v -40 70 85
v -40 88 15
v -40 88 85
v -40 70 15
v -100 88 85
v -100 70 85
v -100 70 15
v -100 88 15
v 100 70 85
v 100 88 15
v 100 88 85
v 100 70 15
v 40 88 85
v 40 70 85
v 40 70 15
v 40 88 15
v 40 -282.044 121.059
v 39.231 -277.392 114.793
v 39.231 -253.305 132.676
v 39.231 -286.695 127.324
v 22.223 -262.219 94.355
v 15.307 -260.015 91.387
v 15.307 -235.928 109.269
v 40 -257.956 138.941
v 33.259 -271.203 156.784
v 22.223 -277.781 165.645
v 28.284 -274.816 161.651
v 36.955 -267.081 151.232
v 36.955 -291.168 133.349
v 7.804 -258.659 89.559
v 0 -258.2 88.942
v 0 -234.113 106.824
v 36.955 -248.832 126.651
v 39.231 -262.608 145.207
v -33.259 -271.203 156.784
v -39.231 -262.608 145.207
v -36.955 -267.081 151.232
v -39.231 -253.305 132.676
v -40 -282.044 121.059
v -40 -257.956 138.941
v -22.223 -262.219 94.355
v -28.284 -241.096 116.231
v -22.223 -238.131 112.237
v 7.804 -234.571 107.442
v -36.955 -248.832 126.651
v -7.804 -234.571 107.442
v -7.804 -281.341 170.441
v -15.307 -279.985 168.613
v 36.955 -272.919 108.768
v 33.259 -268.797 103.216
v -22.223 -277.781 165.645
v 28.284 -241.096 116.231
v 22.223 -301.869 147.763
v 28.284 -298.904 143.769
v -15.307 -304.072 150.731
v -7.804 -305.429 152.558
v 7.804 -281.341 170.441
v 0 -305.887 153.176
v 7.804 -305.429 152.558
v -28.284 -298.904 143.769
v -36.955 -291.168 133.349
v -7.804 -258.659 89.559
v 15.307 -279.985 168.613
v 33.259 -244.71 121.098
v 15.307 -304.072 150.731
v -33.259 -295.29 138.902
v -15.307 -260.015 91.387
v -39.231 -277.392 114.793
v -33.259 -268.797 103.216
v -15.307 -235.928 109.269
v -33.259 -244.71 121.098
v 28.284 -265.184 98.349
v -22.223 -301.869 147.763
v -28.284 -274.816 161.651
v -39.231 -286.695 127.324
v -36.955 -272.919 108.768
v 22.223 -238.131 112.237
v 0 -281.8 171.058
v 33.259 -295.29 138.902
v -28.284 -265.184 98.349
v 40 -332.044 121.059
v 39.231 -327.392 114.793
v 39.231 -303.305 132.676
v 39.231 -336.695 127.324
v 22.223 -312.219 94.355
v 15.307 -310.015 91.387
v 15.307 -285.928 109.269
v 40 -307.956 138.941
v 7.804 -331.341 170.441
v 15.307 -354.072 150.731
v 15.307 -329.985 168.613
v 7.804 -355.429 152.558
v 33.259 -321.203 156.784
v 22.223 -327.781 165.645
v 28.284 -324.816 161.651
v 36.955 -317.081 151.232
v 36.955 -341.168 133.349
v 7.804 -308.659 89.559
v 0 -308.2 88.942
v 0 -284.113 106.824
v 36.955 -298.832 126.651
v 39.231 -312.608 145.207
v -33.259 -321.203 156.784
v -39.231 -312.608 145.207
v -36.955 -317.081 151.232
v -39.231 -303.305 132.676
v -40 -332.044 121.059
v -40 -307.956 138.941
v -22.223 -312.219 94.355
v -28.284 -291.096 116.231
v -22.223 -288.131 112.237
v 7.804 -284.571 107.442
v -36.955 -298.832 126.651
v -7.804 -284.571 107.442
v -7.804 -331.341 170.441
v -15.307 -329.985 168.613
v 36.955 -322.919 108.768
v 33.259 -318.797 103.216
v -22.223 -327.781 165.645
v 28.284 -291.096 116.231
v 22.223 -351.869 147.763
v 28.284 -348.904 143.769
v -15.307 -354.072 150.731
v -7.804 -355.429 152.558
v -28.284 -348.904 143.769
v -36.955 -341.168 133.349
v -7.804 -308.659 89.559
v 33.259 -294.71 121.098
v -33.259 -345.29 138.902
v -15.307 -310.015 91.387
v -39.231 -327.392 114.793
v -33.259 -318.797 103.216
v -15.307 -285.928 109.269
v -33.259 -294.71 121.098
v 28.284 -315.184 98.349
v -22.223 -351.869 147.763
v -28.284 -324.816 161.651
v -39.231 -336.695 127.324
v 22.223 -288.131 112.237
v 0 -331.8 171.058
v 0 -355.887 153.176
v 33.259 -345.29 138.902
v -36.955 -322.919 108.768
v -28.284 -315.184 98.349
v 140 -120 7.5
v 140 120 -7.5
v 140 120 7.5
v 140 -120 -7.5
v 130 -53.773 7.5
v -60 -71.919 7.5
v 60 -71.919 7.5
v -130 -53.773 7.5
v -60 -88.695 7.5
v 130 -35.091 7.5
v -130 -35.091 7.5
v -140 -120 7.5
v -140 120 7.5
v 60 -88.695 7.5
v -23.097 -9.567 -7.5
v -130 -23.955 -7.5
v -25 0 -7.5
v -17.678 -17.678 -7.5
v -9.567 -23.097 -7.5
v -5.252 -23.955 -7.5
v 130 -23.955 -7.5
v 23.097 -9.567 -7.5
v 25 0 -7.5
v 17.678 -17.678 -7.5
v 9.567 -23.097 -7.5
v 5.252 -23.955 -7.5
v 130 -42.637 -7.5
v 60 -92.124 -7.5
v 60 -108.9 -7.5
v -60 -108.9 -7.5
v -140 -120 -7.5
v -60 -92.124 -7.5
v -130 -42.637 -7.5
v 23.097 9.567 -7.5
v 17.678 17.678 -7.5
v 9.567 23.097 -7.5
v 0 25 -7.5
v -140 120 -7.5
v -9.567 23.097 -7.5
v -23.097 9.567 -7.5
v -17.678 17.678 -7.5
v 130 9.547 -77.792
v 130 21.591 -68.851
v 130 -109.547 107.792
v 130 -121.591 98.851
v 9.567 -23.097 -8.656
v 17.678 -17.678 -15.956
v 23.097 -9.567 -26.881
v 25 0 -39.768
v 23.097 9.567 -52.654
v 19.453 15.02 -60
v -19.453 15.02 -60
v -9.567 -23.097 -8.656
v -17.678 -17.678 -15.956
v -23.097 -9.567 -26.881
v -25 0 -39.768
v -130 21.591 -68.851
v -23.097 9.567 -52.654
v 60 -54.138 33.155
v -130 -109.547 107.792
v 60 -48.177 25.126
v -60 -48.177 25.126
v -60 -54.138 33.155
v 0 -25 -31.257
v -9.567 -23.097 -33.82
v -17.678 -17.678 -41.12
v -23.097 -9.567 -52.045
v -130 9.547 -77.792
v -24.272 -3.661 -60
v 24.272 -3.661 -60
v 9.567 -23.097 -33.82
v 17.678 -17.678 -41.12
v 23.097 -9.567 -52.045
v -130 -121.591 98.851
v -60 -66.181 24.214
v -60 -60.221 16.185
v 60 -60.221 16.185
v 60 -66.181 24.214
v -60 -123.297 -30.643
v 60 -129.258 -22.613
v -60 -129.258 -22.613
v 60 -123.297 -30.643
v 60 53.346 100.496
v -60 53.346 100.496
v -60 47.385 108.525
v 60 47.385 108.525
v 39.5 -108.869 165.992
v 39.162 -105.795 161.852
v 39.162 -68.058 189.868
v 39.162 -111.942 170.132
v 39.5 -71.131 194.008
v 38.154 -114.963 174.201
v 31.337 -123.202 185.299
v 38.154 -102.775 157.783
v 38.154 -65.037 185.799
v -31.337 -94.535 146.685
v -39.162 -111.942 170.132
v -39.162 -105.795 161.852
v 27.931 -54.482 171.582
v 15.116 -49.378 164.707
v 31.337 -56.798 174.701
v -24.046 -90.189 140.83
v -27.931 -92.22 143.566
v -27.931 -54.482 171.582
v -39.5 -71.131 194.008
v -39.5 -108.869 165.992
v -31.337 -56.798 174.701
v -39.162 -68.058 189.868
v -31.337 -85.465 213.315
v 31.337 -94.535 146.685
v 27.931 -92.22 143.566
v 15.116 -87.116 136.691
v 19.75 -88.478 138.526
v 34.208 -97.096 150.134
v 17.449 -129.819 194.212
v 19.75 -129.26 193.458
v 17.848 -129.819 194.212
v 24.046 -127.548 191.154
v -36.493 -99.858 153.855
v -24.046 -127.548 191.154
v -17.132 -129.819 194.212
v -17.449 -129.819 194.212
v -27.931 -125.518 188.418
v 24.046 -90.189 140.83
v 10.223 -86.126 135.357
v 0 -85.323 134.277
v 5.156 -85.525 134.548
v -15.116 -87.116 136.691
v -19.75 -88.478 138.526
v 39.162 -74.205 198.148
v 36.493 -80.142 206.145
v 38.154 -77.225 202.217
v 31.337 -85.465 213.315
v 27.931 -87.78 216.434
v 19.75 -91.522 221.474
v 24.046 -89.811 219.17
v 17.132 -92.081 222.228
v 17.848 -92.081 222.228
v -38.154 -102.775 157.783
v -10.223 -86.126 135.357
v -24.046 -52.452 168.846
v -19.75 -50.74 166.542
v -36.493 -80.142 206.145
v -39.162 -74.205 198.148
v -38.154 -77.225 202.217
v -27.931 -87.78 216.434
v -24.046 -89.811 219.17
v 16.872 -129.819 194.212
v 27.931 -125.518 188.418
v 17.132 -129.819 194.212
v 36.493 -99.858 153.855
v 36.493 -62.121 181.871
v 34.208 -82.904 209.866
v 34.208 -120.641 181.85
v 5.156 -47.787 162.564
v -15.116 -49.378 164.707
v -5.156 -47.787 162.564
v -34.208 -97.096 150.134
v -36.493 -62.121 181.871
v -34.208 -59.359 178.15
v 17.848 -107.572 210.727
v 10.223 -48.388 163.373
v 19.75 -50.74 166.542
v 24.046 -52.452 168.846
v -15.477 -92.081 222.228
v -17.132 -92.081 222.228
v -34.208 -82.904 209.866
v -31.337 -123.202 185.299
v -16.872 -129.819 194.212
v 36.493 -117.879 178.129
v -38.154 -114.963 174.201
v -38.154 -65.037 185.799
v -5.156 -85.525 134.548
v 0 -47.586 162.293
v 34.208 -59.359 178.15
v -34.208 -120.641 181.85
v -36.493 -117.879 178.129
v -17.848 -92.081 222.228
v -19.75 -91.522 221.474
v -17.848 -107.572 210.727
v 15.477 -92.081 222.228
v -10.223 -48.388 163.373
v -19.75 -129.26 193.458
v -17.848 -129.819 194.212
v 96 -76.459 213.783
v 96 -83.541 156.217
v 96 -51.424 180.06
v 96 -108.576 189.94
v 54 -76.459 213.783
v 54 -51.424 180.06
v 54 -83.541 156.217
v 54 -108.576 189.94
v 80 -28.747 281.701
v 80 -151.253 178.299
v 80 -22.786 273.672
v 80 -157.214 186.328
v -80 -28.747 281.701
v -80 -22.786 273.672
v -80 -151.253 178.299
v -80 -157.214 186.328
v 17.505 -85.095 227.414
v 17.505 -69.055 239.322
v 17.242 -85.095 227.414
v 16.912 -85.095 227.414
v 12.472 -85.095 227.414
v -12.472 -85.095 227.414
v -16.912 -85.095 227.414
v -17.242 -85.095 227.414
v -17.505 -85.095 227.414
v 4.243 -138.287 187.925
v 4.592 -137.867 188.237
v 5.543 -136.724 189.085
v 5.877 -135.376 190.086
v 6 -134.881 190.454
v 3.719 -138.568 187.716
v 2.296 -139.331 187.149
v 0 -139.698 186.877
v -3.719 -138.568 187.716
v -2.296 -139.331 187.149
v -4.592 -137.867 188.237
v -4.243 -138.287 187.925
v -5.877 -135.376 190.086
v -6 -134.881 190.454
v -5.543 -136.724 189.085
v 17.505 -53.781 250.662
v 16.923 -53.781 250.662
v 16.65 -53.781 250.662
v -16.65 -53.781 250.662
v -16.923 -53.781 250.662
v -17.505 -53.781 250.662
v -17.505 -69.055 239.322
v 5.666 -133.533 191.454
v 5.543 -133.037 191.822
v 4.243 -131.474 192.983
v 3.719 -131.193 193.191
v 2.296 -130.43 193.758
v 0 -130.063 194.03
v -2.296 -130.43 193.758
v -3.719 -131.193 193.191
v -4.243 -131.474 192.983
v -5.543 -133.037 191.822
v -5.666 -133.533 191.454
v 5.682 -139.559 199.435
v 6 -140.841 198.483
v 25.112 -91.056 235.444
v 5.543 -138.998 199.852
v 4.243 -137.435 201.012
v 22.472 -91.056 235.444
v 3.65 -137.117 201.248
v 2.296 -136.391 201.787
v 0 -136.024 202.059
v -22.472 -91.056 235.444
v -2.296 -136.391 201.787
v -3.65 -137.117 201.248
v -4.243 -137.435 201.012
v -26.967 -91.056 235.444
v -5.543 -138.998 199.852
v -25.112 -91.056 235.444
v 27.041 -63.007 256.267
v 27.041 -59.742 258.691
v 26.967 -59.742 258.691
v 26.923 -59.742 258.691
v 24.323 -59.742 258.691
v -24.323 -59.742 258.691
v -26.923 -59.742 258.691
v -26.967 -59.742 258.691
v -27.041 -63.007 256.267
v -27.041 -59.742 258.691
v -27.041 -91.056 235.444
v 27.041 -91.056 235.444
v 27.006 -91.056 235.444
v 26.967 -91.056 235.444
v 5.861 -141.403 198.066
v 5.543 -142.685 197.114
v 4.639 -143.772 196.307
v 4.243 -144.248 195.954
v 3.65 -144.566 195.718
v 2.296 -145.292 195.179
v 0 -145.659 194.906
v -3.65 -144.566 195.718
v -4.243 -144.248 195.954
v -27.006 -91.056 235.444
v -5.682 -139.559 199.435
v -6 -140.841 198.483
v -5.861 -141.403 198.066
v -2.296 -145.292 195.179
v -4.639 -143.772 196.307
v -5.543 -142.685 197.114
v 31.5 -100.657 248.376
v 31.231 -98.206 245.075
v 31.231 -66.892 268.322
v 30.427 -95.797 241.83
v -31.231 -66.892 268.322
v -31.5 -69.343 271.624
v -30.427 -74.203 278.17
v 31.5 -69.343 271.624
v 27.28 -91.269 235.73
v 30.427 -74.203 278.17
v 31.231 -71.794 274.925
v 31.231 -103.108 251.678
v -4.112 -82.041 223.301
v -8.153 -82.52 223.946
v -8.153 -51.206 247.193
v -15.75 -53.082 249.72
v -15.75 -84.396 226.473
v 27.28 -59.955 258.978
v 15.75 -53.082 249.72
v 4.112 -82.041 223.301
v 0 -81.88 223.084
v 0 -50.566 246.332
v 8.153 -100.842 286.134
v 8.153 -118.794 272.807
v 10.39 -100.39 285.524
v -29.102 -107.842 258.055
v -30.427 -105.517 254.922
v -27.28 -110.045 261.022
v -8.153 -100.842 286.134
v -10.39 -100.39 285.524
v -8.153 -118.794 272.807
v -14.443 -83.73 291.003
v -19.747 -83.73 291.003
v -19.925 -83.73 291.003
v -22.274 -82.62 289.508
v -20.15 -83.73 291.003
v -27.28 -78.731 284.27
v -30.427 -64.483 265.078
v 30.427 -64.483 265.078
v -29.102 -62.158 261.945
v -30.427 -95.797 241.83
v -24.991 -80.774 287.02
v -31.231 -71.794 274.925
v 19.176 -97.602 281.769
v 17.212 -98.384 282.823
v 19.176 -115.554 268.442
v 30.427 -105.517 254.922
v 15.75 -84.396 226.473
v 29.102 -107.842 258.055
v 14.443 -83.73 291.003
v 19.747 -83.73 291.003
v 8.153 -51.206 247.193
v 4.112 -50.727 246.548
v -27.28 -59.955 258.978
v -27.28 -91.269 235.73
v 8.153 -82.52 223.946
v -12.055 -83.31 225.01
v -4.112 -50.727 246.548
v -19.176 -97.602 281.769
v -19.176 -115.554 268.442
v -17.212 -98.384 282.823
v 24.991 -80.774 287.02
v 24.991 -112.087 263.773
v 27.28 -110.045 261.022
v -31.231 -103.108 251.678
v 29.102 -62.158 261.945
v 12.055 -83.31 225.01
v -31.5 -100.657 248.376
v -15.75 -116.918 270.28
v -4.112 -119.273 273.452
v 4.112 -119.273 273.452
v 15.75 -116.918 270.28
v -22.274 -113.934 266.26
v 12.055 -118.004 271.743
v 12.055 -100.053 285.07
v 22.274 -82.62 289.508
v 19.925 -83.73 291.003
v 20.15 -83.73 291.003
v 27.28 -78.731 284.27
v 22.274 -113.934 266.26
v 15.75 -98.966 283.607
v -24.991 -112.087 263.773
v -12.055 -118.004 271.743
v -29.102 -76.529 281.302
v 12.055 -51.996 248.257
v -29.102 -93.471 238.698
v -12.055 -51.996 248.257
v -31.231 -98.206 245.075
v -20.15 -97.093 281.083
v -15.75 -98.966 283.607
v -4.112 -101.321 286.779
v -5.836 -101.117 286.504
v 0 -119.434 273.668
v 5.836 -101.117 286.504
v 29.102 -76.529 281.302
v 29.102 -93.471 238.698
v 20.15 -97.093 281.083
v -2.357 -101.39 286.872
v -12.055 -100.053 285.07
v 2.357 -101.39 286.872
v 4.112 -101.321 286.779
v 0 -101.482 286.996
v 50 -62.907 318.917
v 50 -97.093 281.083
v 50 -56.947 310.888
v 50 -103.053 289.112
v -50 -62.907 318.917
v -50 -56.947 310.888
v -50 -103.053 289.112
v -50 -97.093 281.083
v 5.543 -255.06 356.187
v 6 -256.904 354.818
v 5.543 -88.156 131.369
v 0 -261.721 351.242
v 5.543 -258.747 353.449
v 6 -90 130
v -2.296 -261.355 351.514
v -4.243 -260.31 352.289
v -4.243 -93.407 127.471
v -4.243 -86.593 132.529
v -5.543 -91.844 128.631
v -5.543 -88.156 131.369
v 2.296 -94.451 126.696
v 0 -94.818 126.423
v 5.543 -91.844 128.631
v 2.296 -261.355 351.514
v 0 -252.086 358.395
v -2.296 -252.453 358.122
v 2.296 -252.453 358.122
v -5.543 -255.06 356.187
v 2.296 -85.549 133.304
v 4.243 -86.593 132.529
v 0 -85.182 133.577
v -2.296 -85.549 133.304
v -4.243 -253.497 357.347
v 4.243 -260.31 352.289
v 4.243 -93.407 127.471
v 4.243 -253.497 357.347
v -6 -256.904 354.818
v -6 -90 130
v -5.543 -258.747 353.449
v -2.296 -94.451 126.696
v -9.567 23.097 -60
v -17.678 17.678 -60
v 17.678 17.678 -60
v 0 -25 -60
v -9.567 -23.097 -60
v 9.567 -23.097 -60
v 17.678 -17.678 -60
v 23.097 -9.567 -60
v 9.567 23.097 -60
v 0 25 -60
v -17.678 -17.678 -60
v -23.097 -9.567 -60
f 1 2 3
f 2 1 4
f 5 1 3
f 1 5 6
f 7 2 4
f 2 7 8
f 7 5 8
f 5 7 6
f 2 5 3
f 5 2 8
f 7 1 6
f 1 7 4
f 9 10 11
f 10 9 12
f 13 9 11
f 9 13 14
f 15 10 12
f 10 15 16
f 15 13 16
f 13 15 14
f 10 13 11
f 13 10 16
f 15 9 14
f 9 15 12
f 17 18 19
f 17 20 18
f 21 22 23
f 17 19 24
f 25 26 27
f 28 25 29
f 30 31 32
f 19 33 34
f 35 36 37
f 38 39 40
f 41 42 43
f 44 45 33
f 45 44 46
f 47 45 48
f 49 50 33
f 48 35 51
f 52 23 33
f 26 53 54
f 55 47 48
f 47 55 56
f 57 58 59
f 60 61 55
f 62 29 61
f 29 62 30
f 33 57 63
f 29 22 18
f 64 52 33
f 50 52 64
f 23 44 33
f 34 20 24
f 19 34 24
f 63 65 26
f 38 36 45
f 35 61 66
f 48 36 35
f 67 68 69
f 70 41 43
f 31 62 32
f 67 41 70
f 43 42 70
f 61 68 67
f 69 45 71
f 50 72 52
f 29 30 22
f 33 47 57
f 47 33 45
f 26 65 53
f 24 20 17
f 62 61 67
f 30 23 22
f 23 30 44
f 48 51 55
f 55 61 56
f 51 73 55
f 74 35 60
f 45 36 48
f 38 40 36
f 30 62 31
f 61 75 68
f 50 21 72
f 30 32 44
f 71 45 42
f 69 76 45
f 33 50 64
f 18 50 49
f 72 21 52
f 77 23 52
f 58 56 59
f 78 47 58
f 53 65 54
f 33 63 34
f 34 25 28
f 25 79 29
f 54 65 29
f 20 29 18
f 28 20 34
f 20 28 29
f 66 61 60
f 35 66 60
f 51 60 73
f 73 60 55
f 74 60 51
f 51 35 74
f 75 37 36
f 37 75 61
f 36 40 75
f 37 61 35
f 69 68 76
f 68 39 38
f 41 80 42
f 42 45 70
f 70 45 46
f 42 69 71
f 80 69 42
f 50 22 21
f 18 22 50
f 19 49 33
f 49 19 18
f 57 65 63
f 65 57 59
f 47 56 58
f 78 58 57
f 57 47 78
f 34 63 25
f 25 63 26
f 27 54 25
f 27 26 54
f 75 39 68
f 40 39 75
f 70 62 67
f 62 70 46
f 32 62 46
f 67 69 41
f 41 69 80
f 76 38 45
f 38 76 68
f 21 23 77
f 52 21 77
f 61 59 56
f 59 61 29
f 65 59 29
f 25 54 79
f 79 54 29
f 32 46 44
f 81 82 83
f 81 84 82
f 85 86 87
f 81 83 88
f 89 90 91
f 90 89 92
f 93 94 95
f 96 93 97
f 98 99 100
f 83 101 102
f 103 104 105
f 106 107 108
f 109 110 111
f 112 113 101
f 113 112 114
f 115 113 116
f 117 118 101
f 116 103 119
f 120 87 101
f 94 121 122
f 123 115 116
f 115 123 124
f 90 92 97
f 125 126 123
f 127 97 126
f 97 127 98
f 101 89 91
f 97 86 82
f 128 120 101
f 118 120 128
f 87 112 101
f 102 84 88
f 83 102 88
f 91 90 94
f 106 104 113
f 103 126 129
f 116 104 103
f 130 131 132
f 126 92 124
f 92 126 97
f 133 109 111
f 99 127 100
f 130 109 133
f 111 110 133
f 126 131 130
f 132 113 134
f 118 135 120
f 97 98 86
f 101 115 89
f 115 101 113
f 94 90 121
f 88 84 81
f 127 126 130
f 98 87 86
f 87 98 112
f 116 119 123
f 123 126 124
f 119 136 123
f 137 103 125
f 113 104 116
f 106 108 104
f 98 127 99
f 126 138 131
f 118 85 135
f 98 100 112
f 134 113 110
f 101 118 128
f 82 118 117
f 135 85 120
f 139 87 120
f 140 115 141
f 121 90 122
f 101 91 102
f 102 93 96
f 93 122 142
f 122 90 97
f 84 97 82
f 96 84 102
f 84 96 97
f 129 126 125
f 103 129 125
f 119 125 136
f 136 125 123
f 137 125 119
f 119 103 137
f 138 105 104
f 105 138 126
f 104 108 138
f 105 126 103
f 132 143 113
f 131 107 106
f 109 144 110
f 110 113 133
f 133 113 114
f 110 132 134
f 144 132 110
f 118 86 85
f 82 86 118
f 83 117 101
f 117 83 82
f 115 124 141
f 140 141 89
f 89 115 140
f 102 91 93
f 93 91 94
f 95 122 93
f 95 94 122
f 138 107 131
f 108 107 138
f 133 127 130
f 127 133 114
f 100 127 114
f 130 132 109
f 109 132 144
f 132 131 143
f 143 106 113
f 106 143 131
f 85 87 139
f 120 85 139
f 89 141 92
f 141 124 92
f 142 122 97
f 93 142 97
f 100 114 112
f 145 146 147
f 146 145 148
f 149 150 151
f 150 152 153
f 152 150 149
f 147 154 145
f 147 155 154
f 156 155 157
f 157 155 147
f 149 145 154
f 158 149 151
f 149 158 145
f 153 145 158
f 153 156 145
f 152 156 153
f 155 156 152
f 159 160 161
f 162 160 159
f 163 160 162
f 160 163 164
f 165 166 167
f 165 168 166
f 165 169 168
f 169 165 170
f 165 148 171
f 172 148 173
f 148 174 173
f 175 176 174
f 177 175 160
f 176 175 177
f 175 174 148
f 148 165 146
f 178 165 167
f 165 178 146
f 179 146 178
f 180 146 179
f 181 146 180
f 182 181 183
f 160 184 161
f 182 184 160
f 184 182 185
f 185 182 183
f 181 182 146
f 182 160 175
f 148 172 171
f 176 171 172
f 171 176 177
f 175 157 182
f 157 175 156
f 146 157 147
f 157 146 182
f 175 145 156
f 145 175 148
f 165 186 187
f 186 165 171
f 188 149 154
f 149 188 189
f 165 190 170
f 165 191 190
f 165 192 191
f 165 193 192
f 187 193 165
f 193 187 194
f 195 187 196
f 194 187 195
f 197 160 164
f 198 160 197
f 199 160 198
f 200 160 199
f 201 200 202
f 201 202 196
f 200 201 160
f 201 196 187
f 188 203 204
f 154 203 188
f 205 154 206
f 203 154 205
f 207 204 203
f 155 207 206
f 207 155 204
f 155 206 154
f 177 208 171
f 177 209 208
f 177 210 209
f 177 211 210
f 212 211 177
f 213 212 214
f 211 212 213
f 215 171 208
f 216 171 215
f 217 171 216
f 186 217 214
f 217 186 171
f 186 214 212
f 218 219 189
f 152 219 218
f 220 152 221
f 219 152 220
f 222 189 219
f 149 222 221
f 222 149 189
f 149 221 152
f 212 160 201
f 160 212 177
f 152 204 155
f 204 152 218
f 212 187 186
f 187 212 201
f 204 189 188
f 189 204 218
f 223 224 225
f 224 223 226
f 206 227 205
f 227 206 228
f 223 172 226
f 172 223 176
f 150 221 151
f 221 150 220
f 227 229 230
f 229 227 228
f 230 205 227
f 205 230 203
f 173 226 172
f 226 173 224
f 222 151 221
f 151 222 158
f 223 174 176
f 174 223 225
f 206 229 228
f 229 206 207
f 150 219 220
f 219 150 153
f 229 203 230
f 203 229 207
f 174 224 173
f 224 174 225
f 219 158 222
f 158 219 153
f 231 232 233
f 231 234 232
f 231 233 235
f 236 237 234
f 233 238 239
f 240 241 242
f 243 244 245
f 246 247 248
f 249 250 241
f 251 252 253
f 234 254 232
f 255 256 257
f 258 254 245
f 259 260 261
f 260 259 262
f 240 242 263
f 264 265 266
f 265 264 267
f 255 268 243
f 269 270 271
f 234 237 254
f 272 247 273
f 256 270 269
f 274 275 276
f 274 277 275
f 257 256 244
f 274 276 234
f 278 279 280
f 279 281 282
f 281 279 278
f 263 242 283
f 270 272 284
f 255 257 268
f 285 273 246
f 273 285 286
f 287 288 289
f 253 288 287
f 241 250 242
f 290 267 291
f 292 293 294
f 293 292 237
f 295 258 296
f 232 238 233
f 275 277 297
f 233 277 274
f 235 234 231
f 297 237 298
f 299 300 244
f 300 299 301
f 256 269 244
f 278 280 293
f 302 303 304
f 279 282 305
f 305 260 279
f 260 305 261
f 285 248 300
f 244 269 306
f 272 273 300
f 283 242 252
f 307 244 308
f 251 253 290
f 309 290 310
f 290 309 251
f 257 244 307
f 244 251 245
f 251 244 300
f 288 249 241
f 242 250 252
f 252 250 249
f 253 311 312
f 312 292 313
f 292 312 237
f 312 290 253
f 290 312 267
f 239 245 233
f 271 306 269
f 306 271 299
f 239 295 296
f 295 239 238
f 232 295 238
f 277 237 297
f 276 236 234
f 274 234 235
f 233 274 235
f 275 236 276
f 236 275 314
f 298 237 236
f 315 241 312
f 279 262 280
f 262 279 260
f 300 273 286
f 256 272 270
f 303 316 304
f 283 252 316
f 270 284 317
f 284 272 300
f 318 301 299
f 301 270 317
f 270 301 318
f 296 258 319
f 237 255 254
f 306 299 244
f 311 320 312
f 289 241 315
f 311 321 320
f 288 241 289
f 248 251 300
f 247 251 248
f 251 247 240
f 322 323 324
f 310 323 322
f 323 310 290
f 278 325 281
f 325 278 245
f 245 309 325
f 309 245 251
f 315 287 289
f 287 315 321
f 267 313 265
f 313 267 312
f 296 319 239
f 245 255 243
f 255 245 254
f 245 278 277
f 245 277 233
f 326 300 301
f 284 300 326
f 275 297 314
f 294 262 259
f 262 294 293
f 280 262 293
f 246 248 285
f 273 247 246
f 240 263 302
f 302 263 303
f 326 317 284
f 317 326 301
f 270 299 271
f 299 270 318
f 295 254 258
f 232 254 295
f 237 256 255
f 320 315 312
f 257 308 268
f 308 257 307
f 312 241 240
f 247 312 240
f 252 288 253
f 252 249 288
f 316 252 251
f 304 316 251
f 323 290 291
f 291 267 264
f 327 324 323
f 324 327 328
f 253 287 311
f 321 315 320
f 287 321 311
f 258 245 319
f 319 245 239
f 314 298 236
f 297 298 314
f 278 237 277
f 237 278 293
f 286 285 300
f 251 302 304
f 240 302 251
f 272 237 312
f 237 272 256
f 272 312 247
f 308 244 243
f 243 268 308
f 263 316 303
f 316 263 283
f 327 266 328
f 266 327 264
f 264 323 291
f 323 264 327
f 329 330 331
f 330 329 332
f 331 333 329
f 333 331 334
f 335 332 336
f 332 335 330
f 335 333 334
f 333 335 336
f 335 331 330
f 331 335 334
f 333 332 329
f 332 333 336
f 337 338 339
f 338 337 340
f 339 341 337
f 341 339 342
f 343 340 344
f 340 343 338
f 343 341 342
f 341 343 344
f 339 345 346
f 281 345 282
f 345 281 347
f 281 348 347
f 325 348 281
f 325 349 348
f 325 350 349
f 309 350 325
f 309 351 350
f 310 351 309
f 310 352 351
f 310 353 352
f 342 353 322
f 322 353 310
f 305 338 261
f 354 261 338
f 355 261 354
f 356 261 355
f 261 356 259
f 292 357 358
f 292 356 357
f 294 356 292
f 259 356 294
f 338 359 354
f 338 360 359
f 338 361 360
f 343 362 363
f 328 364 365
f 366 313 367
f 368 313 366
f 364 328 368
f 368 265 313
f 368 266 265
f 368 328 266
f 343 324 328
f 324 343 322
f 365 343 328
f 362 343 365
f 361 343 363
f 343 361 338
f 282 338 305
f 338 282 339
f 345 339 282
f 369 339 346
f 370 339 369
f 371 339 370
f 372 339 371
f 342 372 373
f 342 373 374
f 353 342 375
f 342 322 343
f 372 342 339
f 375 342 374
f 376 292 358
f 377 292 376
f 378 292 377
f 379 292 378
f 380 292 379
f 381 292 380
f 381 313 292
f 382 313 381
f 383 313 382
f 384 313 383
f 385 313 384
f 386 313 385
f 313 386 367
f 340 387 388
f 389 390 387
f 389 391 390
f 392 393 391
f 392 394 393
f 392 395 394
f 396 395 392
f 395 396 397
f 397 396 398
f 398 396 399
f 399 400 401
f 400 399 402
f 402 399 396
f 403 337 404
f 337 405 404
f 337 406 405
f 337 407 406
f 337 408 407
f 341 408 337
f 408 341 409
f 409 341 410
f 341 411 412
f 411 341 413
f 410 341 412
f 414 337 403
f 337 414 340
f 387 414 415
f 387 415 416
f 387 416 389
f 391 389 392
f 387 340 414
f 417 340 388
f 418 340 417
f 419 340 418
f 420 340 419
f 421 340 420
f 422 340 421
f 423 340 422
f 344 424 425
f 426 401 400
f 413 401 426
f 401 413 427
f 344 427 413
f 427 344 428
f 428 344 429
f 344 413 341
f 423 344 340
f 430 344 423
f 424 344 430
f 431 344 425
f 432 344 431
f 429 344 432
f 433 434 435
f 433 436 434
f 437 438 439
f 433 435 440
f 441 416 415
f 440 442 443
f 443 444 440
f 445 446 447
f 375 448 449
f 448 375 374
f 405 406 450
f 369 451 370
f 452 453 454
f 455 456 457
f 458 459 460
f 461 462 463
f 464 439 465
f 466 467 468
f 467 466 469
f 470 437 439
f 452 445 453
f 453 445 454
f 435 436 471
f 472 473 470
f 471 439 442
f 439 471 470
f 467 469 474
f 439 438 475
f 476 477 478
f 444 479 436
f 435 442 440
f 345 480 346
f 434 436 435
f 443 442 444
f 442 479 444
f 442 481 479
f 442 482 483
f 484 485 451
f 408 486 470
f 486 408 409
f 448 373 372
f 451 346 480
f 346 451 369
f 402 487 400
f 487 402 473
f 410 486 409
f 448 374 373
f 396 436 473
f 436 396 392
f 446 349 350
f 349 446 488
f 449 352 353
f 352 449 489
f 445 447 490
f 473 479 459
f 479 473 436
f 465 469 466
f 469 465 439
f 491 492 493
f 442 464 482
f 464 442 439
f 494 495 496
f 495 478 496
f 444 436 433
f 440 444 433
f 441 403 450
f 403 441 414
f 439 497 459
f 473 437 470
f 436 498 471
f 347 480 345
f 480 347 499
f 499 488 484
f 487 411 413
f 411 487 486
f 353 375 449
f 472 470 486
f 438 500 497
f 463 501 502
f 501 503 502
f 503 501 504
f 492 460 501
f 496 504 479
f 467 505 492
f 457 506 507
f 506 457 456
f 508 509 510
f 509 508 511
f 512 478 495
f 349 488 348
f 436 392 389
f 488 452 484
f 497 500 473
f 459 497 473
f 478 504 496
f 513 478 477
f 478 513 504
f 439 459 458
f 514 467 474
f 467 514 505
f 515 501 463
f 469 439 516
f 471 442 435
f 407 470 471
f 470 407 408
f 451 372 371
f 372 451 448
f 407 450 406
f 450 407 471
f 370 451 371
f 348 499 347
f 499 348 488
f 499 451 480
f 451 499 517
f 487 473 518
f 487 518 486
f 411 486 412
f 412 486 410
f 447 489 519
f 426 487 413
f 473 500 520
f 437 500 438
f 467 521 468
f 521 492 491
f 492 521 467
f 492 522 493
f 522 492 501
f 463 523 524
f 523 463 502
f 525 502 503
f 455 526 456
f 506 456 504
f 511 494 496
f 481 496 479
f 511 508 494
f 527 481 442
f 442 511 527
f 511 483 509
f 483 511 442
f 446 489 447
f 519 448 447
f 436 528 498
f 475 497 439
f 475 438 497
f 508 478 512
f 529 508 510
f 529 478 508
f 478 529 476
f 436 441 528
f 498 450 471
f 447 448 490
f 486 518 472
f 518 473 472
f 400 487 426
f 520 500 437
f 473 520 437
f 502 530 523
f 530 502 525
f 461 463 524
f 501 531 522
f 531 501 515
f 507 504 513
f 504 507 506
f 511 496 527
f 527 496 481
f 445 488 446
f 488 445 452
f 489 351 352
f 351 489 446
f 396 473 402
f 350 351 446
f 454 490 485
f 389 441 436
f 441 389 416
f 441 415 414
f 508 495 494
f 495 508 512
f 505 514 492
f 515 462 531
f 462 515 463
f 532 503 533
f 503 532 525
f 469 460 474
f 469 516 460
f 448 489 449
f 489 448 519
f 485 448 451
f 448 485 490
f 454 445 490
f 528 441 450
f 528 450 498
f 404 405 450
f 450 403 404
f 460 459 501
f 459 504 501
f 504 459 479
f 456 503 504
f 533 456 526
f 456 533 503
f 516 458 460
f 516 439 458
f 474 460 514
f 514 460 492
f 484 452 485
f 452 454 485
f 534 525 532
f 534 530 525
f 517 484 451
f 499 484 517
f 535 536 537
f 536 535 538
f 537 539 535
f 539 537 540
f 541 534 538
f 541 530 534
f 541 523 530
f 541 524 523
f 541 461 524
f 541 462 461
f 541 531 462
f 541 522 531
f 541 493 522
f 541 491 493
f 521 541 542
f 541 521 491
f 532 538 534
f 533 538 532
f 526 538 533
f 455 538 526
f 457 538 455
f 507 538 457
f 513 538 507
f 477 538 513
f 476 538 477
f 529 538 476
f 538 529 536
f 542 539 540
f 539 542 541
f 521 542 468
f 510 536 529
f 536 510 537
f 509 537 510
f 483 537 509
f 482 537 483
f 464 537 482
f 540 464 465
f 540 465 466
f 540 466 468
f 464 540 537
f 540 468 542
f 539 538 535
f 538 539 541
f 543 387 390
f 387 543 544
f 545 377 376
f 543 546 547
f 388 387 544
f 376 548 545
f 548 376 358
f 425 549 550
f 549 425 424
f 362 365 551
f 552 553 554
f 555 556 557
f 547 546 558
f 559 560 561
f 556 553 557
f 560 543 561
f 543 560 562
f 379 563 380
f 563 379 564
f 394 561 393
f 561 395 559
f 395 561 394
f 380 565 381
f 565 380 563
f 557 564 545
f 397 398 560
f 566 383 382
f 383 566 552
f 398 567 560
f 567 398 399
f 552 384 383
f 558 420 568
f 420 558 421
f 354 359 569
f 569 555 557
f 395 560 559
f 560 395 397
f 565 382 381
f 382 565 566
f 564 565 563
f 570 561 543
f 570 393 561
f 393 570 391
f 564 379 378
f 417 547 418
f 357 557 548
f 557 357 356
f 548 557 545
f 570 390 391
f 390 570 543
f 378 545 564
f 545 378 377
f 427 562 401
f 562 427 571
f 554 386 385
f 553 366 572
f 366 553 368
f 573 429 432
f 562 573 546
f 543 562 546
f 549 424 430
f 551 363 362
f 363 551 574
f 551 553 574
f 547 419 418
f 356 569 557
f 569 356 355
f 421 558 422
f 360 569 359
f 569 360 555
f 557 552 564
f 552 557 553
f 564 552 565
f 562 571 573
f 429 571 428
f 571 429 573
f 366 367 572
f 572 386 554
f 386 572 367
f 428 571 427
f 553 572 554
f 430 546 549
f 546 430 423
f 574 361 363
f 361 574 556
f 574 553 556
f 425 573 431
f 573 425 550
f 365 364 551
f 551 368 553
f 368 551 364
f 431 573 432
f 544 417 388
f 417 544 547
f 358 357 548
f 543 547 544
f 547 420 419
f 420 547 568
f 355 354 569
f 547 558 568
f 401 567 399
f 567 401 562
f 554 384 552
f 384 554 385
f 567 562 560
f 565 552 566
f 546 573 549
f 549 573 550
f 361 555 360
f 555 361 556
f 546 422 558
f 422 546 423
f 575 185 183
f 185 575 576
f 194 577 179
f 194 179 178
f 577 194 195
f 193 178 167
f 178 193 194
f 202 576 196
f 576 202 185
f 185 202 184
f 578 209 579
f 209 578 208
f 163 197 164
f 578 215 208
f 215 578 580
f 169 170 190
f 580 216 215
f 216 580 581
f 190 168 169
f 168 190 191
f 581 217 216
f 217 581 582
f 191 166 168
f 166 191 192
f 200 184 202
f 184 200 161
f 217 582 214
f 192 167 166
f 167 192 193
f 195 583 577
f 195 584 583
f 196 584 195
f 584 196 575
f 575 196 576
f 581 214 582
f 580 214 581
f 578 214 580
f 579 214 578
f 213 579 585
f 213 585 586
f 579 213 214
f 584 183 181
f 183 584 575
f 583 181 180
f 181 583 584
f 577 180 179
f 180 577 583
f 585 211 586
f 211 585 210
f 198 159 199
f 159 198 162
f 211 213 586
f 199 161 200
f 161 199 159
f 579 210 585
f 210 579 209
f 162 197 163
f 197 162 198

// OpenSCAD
// ============================================================
// HEM-001 — Full Assembly Preview
// Shows all major components in their assembled positions.
// For reference only — not for manufacturing.
// Open in OpenSCAD with Preview (F5) not Render (F6).
// Revision: 1.0 | 2026-06
// ============================================================
//
// COMPONENT POSITIONS (approximate — schematic arrangement):
//   Z=0:       Bottom of azimuth plate (tripod interface)
//   Z=15:      Top of azimuth plate / bottom of hinge brackets
//   Z=85:      Top of altitude plate (latitude = 53°)
//   Z=100:     Bottom of polar axis spine
//   Z=320:     Top of polar spine / RA housing front plate
//   Z=340:     RA harmonic drive output flange
//   Z=400:     DEC housing plate
//   Z=430:     Vixen saddle / telescope
// ============================================================

// Colours for visual differentiation
AZ_COL    = [0.6, 0.7, 0.8, 0.9];   // light blue-grey — azimuth plate
ALT_COL   = [0.5, 0.6, 0.75, 0.9];  // slightly darker — altitude plate
HINGE_COL = [0.4, 0.5, 0.65, 1.0];  // dark — hinge brackets
RA_COL    = [0.7, 0.75, 0.8, 0.9];  // RA housing
DEC_COL   = [0.65, 0.7, 0.78, 0.9]; // DEC housing
HD_COL    = [0.85, 0.7, 0.2, 1.0];  // gold — harmonic drives
MOTOR_COL = [0.3, 0.3, 0.3, 1.0];   // dark grey — motors
SADDLE_COL= [0.5, 0.5, 0.55, 1.0];  // Vixen saddle

LAT = 53.41;  // tilt angle in degrees (Stockport latitude)

// ---- AZIMUTH PLATE ----
color(AZ_COL)
    translate([0, 0, 0])
        cube([280, 240, 15], center=true);  // approximate placeholder

// ---- ALTITUDE PLATE (tilted at latitude angle) ----
color(ALT_COL)
    translate([0, -50, 15])
    rotate([-LAT, 0, 0])
        cube([260, 220, 15], center=true);

// ---- HINGE BRACKETS (pair) ----
color(HINGE_COL) {
    translate([-100, 70, 15])
        cube([60, 18, 70]);
    translate([40, 70, 15])
        cube([60, 18, 70]);
}

// ---- POLAR AXIS SPINE (tilted with altitude plate) ----
color(RA_COL)
    translate([0, -50, 30])
    rotate([-LAT, 0, 0])
    translate([0, 0, 15])
        cube([120, 10, 220], center=true);

// ---- RA HARMONIC DRIVE (schematic cylinder) ----
color(HD_COL)
    translate([0, -90, 180])
    rotate([-LAT, 0, 0])
        cylinder(d=79, h=47, center=true, $fn=48);

// ---- RA MOTOR (schematic) ----
color(MOTOR_COL)
    translate([75, -80, 185])
    rotate([-LAT, 0, 0])
        cube([42, 42, 40], center=true);

// ---- DEC HOUSING ----
color(DEC_COL)
    translate([0, -90, 230])
    rotate([-LAT, 0, 0])
        cube([160, 10, 160], center=true);

// ---- DEC HARMONIC DRIVE (schematic) ----
color(HD_COL)
    translate([0, -85, 260])
    rotate([-LAT, 0, 0])
        cylinder(d=63, h=39, center=true, $fn=48);

// ---- VIXEN SADDLE ----
color(SADDLE_COL)
    translate([0, -80, 300])
    rotate([-LAT, 0, 0])
        cube([100, 10, 50], center=true);

// ---- COUNTERWEIGHT SHAFT ----
color([0.8, 0.8, 0.82, 1.0])
    translate([0, -90, 130])
    rotate([-LAT, 0, 0])
    rotate([90, 0, 0])
        cylinder(d=12, h=280, $fn=16);

// ---- COUNTERWEIGHTS (2× 1kg schematic) ----
color([0.6, 0.62, 0.65, 1.0]) {
    translate([0, -90 - 180, 130])
    rotate([-LAT, 0, 0])
        cylinder(d=80, h=30, center=true, $fn=32);
    translate([0, -90 - 230, 130])
    rotate([-LAT, 0, 0])
        cylinder(d=80, h=30, center=true, $fn=32);
}

// ---- TRIPOD STUB (schematic — indicates tripod head position) ----
color([0.4, 0.4, 0.4, 0.5])
    translate([0, 0, -60])
        cylinder(d=50, h=60, $fn=16);
